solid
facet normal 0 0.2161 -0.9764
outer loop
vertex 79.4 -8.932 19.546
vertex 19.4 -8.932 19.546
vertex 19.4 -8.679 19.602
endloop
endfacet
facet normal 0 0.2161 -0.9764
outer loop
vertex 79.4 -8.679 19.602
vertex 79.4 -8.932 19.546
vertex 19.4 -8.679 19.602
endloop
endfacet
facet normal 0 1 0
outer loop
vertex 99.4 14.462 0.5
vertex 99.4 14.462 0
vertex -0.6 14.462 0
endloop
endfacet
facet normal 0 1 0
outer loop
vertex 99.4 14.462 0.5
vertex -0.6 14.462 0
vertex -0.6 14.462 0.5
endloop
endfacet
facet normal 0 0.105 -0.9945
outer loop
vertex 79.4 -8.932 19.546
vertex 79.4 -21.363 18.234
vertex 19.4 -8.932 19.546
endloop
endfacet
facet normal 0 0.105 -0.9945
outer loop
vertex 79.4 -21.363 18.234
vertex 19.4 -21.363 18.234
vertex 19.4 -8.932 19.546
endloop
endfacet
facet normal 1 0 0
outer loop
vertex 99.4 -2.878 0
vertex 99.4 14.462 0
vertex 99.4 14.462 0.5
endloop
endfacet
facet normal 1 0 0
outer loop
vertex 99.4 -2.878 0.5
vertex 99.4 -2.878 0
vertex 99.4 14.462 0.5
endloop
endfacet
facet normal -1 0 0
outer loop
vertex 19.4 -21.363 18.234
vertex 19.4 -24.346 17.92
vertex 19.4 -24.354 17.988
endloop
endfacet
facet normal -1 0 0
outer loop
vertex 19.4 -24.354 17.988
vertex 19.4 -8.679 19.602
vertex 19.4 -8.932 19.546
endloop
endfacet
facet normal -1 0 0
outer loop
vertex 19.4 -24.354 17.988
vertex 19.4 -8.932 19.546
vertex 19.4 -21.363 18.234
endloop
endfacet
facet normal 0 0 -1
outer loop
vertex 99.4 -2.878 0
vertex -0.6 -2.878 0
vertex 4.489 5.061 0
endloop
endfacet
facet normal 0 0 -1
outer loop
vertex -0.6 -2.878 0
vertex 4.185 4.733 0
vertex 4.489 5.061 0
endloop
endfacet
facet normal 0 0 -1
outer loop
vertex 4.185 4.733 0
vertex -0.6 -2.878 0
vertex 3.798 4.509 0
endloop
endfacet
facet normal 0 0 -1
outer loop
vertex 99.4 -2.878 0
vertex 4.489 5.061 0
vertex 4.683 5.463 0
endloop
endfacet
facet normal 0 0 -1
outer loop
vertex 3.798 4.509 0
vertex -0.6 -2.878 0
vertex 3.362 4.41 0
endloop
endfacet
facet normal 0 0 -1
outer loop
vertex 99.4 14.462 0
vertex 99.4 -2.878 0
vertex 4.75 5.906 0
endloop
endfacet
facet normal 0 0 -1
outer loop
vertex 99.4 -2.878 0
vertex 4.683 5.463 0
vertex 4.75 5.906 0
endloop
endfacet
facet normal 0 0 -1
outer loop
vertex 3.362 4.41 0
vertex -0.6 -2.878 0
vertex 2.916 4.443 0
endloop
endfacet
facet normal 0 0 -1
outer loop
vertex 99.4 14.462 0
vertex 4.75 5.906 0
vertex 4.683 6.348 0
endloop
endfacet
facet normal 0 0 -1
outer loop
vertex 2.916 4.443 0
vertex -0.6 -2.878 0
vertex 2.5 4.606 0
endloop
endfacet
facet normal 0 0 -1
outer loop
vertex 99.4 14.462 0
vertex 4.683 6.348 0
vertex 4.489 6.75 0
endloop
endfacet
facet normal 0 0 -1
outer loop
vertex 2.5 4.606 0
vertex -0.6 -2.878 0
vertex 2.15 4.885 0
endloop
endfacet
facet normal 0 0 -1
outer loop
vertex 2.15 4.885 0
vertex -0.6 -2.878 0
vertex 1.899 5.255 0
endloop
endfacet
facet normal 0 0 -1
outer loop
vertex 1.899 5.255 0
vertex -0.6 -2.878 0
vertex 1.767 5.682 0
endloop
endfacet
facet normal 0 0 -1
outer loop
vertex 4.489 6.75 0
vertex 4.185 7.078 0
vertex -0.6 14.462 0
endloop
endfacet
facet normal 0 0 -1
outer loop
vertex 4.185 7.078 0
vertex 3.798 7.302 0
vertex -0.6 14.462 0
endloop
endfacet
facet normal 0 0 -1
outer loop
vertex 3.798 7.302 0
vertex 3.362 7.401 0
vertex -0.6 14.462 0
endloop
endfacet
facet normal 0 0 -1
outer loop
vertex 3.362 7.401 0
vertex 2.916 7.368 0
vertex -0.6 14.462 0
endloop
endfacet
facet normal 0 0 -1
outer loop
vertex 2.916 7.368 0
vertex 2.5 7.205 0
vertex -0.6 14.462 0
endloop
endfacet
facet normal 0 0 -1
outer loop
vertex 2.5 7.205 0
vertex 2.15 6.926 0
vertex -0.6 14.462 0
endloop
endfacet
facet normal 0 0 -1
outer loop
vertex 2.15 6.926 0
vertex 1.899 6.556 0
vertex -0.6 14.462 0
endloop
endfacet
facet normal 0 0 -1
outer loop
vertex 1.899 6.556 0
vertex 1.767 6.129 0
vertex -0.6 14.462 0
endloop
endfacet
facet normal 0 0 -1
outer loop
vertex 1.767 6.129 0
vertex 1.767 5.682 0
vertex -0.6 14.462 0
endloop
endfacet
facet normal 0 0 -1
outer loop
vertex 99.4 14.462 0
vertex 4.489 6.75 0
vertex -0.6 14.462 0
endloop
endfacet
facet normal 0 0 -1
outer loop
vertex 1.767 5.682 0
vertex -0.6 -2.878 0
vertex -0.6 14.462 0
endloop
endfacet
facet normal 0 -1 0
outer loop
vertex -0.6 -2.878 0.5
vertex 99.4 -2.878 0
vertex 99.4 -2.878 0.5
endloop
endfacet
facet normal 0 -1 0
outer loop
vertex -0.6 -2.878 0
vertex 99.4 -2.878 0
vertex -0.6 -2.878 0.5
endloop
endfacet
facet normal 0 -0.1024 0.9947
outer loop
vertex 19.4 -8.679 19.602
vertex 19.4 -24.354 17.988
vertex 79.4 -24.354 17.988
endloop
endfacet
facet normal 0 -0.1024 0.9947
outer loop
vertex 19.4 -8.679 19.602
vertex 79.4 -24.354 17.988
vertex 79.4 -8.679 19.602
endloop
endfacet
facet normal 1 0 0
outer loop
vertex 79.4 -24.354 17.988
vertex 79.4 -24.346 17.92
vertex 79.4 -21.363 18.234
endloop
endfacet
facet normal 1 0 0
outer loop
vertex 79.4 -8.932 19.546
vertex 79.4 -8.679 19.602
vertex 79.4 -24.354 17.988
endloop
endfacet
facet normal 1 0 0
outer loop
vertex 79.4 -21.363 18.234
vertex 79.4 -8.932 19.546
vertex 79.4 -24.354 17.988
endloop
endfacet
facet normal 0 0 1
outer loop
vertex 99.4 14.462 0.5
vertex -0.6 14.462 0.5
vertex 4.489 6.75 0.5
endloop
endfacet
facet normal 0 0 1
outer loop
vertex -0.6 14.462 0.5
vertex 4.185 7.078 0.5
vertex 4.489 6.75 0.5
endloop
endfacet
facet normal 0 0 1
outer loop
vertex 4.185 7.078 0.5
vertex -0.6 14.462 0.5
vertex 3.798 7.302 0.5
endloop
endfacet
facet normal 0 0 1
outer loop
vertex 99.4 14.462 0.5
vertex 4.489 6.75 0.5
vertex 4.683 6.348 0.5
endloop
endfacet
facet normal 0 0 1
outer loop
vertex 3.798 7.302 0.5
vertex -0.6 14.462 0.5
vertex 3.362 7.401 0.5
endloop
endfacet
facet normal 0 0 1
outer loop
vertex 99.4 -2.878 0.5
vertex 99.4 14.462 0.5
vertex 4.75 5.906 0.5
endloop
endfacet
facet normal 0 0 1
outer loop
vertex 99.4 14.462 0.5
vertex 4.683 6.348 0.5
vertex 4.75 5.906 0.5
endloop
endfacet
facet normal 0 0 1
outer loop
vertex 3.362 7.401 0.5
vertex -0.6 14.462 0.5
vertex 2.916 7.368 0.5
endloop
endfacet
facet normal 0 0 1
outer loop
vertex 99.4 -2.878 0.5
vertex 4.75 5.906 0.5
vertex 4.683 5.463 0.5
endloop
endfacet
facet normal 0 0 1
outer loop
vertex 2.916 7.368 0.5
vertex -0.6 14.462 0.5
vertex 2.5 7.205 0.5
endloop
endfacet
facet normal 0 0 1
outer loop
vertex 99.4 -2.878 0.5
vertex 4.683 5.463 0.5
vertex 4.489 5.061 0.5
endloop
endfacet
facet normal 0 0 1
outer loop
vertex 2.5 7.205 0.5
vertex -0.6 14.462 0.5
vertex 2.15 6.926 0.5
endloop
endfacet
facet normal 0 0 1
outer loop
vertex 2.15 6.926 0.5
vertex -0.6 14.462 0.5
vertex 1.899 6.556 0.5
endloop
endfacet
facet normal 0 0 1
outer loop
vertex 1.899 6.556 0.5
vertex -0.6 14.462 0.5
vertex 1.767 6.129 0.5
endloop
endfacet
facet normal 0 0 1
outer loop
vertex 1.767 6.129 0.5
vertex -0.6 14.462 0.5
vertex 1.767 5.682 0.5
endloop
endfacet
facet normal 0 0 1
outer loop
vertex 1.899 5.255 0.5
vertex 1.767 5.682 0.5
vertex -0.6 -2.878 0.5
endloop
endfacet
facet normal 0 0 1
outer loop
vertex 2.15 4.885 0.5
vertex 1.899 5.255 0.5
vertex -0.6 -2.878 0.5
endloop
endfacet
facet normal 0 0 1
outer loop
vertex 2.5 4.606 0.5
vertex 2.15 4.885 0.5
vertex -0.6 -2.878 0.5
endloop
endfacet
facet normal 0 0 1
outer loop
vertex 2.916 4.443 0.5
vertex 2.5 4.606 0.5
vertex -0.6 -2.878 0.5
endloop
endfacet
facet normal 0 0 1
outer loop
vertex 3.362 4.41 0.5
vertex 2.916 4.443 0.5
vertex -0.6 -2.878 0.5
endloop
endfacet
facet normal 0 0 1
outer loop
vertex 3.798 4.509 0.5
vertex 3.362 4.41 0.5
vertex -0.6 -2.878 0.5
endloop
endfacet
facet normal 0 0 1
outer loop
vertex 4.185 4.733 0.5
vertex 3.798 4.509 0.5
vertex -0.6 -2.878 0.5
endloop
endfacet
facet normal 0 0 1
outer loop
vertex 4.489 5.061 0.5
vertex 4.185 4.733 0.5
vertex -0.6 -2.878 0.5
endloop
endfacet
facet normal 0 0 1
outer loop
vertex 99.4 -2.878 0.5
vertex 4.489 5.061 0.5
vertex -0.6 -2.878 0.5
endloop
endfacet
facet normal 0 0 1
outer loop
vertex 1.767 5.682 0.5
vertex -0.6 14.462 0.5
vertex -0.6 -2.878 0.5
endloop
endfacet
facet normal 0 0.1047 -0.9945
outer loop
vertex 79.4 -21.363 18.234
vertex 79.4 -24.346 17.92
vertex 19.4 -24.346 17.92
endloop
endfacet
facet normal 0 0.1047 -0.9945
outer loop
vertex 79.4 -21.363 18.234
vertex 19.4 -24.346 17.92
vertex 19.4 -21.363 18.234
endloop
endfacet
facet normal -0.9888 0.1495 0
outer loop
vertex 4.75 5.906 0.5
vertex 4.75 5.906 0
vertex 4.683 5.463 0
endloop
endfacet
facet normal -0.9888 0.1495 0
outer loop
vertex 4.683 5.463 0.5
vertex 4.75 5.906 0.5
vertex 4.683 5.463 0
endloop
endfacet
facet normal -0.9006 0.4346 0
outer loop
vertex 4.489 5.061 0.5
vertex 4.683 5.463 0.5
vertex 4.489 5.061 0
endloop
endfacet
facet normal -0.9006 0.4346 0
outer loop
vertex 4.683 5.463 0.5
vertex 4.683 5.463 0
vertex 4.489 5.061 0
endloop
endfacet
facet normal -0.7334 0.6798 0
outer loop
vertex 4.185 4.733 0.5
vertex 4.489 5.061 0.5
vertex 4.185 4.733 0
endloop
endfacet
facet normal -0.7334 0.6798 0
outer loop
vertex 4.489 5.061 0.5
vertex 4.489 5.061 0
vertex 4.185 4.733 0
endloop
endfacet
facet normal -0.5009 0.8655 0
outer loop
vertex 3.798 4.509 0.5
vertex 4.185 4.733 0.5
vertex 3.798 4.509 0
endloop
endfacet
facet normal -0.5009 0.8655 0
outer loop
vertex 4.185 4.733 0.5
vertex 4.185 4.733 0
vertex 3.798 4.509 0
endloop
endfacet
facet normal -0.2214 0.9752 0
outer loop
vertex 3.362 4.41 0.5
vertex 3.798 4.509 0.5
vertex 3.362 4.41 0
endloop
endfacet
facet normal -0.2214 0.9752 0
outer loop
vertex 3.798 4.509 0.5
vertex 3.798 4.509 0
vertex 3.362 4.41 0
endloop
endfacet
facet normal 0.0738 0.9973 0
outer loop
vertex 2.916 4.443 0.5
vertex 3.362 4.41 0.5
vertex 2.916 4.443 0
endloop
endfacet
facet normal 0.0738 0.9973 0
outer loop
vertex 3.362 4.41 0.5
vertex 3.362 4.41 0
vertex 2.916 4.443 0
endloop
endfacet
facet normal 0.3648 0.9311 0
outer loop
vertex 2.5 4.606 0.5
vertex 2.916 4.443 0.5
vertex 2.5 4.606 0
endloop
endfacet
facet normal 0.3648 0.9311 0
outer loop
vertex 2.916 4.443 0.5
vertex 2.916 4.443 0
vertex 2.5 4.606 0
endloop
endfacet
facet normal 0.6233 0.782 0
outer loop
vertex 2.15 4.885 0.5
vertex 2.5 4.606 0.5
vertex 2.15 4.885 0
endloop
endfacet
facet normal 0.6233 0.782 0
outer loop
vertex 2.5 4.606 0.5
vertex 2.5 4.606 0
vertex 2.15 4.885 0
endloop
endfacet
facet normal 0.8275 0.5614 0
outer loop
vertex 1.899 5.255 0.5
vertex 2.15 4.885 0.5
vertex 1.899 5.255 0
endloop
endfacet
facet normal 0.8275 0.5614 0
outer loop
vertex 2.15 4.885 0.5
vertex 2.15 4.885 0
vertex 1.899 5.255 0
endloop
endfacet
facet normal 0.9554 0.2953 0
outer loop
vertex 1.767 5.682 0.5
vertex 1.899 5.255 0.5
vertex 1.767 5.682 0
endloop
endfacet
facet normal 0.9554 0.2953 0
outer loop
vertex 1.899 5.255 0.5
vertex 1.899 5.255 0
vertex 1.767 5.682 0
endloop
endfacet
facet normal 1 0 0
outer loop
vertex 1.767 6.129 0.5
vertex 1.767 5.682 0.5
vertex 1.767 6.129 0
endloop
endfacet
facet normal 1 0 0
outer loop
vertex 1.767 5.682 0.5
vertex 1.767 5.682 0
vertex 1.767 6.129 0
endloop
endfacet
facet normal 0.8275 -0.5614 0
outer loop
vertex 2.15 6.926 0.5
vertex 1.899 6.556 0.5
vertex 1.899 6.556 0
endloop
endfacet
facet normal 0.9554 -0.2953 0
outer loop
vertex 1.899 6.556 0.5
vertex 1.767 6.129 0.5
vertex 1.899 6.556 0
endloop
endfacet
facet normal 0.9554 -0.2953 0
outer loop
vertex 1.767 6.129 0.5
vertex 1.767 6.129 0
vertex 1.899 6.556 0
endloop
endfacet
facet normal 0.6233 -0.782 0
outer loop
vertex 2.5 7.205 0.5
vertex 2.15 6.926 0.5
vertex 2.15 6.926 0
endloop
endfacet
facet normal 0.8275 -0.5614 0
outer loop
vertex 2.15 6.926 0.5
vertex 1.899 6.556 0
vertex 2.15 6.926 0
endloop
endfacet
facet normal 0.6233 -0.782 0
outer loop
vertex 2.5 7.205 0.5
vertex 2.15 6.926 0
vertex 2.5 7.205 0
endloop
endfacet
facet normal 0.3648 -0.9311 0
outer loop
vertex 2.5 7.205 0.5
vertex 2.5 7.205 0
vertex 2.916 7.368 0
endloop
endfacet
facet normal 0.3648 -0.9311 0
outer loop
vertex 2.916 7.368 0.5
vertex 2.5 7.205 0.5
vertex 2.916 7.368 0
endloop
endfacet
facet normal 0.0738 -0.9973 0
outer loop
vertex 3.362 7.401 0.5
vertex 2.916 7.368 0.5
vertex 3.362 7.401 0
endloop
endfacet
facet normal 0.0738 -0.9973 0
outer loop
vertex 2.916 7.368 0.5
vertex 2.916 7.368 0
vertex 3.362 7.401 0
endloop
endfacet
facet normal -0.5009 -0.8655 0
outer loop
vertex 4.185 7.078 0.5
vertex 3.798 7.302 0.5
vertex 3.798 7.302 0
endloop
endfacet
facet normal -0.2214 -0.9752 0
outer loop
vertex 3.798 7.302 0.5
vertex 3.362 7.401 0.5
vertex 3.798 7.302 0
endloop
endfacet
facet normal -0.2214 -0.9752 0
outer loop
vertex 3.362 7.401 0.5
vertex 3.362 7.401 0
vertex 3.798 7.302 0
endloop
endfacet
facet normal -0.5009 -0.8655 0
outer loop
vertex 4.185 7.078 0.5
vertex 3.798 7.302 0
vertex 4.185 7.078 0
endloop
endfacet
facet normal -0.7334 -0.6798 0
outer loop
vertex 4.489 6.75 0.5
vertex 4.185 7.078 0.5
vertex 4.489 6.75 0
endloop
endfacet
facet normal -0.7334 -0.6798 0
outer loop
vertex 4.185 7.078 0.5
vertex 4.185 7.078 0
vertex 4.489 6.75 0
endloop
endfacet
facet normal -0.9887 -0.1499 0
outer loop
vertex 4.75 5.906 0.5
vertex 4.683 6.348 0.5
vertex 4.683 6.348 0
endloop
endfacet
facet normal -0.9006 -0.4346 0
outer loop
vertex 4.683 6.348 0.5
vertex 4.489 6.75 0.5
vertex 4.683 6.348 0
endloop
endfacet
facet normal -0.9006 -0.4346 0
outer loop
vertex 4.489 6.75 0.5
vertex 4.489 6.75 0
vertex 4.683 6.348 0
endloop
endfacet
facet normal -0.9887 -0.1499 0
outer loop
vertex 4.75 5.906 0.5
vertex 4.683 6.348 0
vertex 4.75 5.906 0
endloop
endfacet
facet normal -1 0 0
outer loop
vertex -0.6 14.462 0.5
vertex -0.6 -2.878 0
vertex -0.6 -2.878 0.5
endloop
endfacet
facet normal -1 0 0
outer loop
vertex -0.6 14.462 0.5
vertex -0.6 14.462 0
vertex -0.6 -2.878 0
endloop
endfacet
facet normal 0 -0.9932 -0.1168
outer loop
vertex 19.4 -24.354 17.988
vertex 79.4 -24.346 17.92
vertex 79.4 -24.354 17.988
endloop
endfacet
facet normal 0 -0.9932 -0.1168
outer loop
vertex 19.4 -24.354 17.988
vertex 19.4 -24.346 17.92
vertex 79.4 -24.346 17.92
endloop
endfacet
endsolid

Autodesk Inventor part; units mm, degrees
ref_plane "YZ Plane" through (0, 0, 0) normal (1, 0, 0) x (0, 1, 0)
ref_plane "XZ Plane" through (0, 0, 0) normal (0, 1, 0) x (-1, 0, 0)
sketch "Szkic1" plane through (0, 0, 0) normal (0, 0, 1) x (1, 0, 0)
  line L0 (-0.6, 0) -> (-0.6, 13.1255) projected
  line L1 (2.7848, 0) -> (-0.6, 0) projected
  spline S0 degree 3 poles (3.0833, 0.1968) (3.0705, 0.1915) (3.0579, 0.186) (2.9555, 0.1384) (2.8611, 0.0732) (2.7848, 0) knots 0.608558 0.608558 0.608558 0.608558 0.612587 0.612587 0.642436 0.642436 0.642436 0.642436 projected
  spline S1 degree 3 poles (3.0833, 0.1968) (3.1541, 0.2257) (3.223, 0.256) (3.5835, 0.4251) (3.888, 0.6087) (4.4504, 1.0382) (4.7087, 1.2836) (5.1613, 1.7912) (5.3932, 2.1042) (5.7913, 2.77) (5.9577, 3.1227) (6.2121, 3.7972) (6.3223, 4.1828) (6.4663, 4.968) (6.5, 5.3675) (6.5, 5.7331) knots -1.428143 -1.428143 -1.428143 -1.428143 -1.406087 -1.406087 -1.308684 -1.308684 -1.211282 -1.211282 -1.104676 -1.104676 -0.99807 -0.99807 -0.888411 -0.888411 -0.778752 -0.778752 -0.778752 -0.778752 projected
  line L2 (6.5, 5.7331) -> (6.5, 13.1255) projected
  line L3 (6.5, 13.1255) -> (-0.6, 13.1255) projected
  circle A0 centre (3.25, 5.9055) radius 1.5 projected
  line L4 (99.4, 0.1219) -> (99.4, 13.1642) projected
  line L5 (92.3, 13.1642) -> (99.4, 13.1642) projected
  line L6 (92.3, 0.1219) -> (92.3, 13.1642) projected
  line L7 (92.3, 0.1219) -> (99.4, 0.1219) projected
  line L8 (-0.6, 13.1255) -> (99.4, 13.1255)
  line L9 (99.4, 13.1255) -> (99.4, 0.1219)
  line L10 (99.4, 0.1219) -> (-0.6, 0.1219)
  line L11 (-0.6, 0.1219) -> (-0.6, 13.1255)
  line L12 (-0.6, 0.1219) -> (99.4, 0.1219)
  line L13 (99.4, 0.1219) -> (99.4, -2.8781)
  line L14 (99.4, -2.8781) -> (-0.6, -2.8781)
  line L15 (-0.6, -2.8781) -> (-0.6, 0.1219)
  line L16 (19.4, 0.1219) -> (79.4, 0.1219)
  line L17 (79.4, 0.1219) -> (79.4, -19.8781)
  line L18 (79.4, -19.8781) -> (19.4, -19.8781)
  line L19 (19.4, -19.8781) -> (19.4, 0.1219)
  ellipse E0 centre (2.95, 26.8204) end of major axis (4.45, 26.8204) minor radius 0.3241 projected
  ellipse E1 centre (49.4, 17.3721) end of major axis (50.4, 17.3721) minor radius 0.2161 projected
  ellipse E2 centre (73.9, 17.3721) end of major axis (74.9, 17.3721) minor radius 0.2161 projected
  ellipse E3 centre (24.9, 19.4245) end of major axis (25.9, 19.4245) minor radius 0.2161 projected
  ellipse E4 centre (95.85, 26.8204) end of major axis (97.35, 26.8204) minor radius 0.3241 projected
  ellipse E5 centre (2.95, 16.7506) end of major axis (4.45, 16.7506) minor radius 0.3241 projected
  ellipse E6 centre (49.4, 19.4245) end of major axis (50.4, 19.4245) minor radius 0.2161 projected
  ellipse E7 centre (73.9, 19.4245) end of major axis (74.9, 19.4245) minor radius 0.2161 projected
  ellipse E8 centre (24.9, 17.3721) end of major axis (25.9, 17.3721) minor radius 0.2161 projected
  ellipse E9 centre (95.85, 16.7506) end of major axis (97.35, 16.7506) minor radius 0.3241 projected
  ellipse E10 centre (44.2014, 21.2376) end of major axis (46.7514, 21.2376) minor radius 0.5509 projected
  ellipse E11 centre (35.3114, 21.2376) end of major axis (37.8614, 21.2376) minor radius 0.5509 projected
  ellipse E12 centre (53.0914, 21.2376) end of major axis (55.6414, 21.2376) minor radius 0.5509 projected
  line L20 (28.3783, 20.6632) -> (17.5183, 20.6632) projected
  line L21 (17.5183, 20.6632) -> (17.5183, 21.3633) projected
  line L22 (17.5183, 21.3633) -> (28.3783, 21.3633) projected
  line L23 (28.3783, 21.3633) -> (28.3783, 20.6632) projected
  line L24 (77.2802, 20.6127) -> (77.2802, 22.1251) projected
  line L25 (77.2802, 22.1251) -> (84.2802, 22.1251) projected
  line L26 (84.2802, 22.1251) -> (84.2802, 20.6127) projected
  line L27 (84.2802, 20.6127) -> (77.2802, 20.6127) projected
  line L28 (99.4, 14.3474) -> (99.4, 29.4709) projected
  line L29 (99.4, 29.4709) -> (-0.6, 29.4709) projected
  line L30 (-0.6, 29.4709) -> (-0.6, 14.3474) projected
  line L31 (-0.6, 14.3474) -> (99.4, 14.3474) projected
  line L32 (99.4, 13.1255) -> (-0.6, 13.1255)
  line L33 (-0.6, 13.1255) -> (-0.6, 14.3474)
  line L34 (-0.6, 14.3474) -> (99.4, 14.3474)
  line L35 (99.4, 14.3474) -> (99.4, 13.1255)
  ellipse E13 centre (95.55, 5.99) end of major axis (97.05, 5.99) minor radius 1.4905 projected
  point P0 (0, 0)
  point P1 (49.4, 0.1219)
  point P2 (49.4, 0.1219)
  point P3 (49.4, 0.1219)
  point P4 (19.4, -2.8781)
  point P5 (79.4, -2.8781)
  point P6 (92.3, 13.1255)
  point P7 (2.9401, 0.1219)
  point P8 (92.3, 13.1255)
  dimension "d0" = 3
  dimension "d1" = 60
  dimension "d2" = 20
extrude "Wyciągnięcie proste1" add sketch "Szkic1" along normal blind 0.5 contours L0 L10 S0 L1 | L1 S0 L10 L19 L14 L15 | L0 L3 L2 S1 S0 L10 | S0 S1 L2 L8 L6 L10 | L19 L10 L17 L14 | L14 L17 L18 L19 | L17 L10 L7 L13 L14 | L8 L4 L7 L6 | E13
sketch "Szkic2" plane through (-0.6, -2.8781, 0) normal (-1, 0, 0) x (0, 0, 1)
  line L0 (0, 16.0036) -> (0, 0) projected
  line L1 (0, 0) -> (0.5, 0) projected
  line L2 (0.5, 16.0036) -> (0.5, 0) projected
  line L3 (0, 16.0036) -> (0.5, 16.0036) projected
  line L4 (0.5, 16.0036) -> (0, 16.0036)
  line L5 (0, 16.0036) -> (0, 17.3406)
  line L6 (0, 17.3406) -> (0.5, 17.3406)
  line L7 (0.5, 17.3406) -> (0.5, 16.0036)
  point P0 (0, 2.8781)
ref_plane "Płaszczyzna konstrukcyjna1" through (99.4, 13.8592, -68.0339) normal (1, 0, 0) x (0, 0.9764, 0.2161)
extrude "Wyciągnięcie proste2" add sketch "Szkic2" against normal up to surface (100 mm away) contours L5 L6 L7 L3
sketch "Szkic3" plane through (19.4, -19.8781, 0) normal (-1, 0, 0) x (0, 0, 1)
  line L0 (0, 17) -> (0, 0) projected
  line L1 (0, 0) -> (0.5, 0) projected
  line L2 (0.5, 17) -> (0.5, 0) projected
  line L3 (0, 17) -> (0.5, 17) projected
  line L4 (18.2345, -1.4849) -> (19.5458, 10.9461) projected
  line L5 (17.9197, -4.4684) -> (18.2345, -1.4849) projected
  line L6 (17.9197, -4.4684) -> (18.417, -4.5208)
  line L7 (18.417, -4.5208) -> (0.5, -174.3651)
  line L8 (19.5458, 10.9461) -> (19.6229, 11.2942)
  line L9 (0.5, -174.3651) -> (19.6018, 11.1992)
  point P0 (0, 19.8781)
  point P1 (0.0183, 10.8546)
  point P2 (17.9883, -4.4756)
  dimension "d7" = 0.5
extrude "Wyciągnięcie proste3" add sketch "Szkic3" against normal up to surface (60 mm away) contours L4 L8 L9 L6 L5
sketch "Szkic4" plane through (19.4, -19.8781, 0.5) normal (-1, 0, 0) x (0, 0, 1)
  line L0 (-0.5, 17) -> (-0.5, 0) projected
  line L1 (-0.5, 0) -> (0, 0) projected
  line L2 (0, 17) -> (0, 0) projected
  line L3 (-0.5, 17) -> (0, 17) projected
  line L4 (-0.5, 0) -> (-0.5, 17) projected
  line L5 (-0.5, 8.7524) -> (0.9116, 15.1318)
  point P0 (-0.5, 19.8781)
  point P1 (0, 11.012)
extrude "Wyciągnięcie proste4" cut sketch "Szkic4" against normal through all
sketch "Szkic5" plane through (19.4, -24.3493, -2.8991) normal (0, -0.2161, 0.9764) x (1, 0, 0)
  ellipse E0 centre (55, 12.4499) end of major axis (56, 12.4499) minor radius 0.9937 projected
  ellipse E1 centre (5, 12.4499) end of major axis (6, 12.4499) minor radius 0.9937 projected
  point P0 (-19.4, 24.4006)
extrude "Wyciągnięcie proste5" [suppressed]
properties part number "pokrywa tylna"
